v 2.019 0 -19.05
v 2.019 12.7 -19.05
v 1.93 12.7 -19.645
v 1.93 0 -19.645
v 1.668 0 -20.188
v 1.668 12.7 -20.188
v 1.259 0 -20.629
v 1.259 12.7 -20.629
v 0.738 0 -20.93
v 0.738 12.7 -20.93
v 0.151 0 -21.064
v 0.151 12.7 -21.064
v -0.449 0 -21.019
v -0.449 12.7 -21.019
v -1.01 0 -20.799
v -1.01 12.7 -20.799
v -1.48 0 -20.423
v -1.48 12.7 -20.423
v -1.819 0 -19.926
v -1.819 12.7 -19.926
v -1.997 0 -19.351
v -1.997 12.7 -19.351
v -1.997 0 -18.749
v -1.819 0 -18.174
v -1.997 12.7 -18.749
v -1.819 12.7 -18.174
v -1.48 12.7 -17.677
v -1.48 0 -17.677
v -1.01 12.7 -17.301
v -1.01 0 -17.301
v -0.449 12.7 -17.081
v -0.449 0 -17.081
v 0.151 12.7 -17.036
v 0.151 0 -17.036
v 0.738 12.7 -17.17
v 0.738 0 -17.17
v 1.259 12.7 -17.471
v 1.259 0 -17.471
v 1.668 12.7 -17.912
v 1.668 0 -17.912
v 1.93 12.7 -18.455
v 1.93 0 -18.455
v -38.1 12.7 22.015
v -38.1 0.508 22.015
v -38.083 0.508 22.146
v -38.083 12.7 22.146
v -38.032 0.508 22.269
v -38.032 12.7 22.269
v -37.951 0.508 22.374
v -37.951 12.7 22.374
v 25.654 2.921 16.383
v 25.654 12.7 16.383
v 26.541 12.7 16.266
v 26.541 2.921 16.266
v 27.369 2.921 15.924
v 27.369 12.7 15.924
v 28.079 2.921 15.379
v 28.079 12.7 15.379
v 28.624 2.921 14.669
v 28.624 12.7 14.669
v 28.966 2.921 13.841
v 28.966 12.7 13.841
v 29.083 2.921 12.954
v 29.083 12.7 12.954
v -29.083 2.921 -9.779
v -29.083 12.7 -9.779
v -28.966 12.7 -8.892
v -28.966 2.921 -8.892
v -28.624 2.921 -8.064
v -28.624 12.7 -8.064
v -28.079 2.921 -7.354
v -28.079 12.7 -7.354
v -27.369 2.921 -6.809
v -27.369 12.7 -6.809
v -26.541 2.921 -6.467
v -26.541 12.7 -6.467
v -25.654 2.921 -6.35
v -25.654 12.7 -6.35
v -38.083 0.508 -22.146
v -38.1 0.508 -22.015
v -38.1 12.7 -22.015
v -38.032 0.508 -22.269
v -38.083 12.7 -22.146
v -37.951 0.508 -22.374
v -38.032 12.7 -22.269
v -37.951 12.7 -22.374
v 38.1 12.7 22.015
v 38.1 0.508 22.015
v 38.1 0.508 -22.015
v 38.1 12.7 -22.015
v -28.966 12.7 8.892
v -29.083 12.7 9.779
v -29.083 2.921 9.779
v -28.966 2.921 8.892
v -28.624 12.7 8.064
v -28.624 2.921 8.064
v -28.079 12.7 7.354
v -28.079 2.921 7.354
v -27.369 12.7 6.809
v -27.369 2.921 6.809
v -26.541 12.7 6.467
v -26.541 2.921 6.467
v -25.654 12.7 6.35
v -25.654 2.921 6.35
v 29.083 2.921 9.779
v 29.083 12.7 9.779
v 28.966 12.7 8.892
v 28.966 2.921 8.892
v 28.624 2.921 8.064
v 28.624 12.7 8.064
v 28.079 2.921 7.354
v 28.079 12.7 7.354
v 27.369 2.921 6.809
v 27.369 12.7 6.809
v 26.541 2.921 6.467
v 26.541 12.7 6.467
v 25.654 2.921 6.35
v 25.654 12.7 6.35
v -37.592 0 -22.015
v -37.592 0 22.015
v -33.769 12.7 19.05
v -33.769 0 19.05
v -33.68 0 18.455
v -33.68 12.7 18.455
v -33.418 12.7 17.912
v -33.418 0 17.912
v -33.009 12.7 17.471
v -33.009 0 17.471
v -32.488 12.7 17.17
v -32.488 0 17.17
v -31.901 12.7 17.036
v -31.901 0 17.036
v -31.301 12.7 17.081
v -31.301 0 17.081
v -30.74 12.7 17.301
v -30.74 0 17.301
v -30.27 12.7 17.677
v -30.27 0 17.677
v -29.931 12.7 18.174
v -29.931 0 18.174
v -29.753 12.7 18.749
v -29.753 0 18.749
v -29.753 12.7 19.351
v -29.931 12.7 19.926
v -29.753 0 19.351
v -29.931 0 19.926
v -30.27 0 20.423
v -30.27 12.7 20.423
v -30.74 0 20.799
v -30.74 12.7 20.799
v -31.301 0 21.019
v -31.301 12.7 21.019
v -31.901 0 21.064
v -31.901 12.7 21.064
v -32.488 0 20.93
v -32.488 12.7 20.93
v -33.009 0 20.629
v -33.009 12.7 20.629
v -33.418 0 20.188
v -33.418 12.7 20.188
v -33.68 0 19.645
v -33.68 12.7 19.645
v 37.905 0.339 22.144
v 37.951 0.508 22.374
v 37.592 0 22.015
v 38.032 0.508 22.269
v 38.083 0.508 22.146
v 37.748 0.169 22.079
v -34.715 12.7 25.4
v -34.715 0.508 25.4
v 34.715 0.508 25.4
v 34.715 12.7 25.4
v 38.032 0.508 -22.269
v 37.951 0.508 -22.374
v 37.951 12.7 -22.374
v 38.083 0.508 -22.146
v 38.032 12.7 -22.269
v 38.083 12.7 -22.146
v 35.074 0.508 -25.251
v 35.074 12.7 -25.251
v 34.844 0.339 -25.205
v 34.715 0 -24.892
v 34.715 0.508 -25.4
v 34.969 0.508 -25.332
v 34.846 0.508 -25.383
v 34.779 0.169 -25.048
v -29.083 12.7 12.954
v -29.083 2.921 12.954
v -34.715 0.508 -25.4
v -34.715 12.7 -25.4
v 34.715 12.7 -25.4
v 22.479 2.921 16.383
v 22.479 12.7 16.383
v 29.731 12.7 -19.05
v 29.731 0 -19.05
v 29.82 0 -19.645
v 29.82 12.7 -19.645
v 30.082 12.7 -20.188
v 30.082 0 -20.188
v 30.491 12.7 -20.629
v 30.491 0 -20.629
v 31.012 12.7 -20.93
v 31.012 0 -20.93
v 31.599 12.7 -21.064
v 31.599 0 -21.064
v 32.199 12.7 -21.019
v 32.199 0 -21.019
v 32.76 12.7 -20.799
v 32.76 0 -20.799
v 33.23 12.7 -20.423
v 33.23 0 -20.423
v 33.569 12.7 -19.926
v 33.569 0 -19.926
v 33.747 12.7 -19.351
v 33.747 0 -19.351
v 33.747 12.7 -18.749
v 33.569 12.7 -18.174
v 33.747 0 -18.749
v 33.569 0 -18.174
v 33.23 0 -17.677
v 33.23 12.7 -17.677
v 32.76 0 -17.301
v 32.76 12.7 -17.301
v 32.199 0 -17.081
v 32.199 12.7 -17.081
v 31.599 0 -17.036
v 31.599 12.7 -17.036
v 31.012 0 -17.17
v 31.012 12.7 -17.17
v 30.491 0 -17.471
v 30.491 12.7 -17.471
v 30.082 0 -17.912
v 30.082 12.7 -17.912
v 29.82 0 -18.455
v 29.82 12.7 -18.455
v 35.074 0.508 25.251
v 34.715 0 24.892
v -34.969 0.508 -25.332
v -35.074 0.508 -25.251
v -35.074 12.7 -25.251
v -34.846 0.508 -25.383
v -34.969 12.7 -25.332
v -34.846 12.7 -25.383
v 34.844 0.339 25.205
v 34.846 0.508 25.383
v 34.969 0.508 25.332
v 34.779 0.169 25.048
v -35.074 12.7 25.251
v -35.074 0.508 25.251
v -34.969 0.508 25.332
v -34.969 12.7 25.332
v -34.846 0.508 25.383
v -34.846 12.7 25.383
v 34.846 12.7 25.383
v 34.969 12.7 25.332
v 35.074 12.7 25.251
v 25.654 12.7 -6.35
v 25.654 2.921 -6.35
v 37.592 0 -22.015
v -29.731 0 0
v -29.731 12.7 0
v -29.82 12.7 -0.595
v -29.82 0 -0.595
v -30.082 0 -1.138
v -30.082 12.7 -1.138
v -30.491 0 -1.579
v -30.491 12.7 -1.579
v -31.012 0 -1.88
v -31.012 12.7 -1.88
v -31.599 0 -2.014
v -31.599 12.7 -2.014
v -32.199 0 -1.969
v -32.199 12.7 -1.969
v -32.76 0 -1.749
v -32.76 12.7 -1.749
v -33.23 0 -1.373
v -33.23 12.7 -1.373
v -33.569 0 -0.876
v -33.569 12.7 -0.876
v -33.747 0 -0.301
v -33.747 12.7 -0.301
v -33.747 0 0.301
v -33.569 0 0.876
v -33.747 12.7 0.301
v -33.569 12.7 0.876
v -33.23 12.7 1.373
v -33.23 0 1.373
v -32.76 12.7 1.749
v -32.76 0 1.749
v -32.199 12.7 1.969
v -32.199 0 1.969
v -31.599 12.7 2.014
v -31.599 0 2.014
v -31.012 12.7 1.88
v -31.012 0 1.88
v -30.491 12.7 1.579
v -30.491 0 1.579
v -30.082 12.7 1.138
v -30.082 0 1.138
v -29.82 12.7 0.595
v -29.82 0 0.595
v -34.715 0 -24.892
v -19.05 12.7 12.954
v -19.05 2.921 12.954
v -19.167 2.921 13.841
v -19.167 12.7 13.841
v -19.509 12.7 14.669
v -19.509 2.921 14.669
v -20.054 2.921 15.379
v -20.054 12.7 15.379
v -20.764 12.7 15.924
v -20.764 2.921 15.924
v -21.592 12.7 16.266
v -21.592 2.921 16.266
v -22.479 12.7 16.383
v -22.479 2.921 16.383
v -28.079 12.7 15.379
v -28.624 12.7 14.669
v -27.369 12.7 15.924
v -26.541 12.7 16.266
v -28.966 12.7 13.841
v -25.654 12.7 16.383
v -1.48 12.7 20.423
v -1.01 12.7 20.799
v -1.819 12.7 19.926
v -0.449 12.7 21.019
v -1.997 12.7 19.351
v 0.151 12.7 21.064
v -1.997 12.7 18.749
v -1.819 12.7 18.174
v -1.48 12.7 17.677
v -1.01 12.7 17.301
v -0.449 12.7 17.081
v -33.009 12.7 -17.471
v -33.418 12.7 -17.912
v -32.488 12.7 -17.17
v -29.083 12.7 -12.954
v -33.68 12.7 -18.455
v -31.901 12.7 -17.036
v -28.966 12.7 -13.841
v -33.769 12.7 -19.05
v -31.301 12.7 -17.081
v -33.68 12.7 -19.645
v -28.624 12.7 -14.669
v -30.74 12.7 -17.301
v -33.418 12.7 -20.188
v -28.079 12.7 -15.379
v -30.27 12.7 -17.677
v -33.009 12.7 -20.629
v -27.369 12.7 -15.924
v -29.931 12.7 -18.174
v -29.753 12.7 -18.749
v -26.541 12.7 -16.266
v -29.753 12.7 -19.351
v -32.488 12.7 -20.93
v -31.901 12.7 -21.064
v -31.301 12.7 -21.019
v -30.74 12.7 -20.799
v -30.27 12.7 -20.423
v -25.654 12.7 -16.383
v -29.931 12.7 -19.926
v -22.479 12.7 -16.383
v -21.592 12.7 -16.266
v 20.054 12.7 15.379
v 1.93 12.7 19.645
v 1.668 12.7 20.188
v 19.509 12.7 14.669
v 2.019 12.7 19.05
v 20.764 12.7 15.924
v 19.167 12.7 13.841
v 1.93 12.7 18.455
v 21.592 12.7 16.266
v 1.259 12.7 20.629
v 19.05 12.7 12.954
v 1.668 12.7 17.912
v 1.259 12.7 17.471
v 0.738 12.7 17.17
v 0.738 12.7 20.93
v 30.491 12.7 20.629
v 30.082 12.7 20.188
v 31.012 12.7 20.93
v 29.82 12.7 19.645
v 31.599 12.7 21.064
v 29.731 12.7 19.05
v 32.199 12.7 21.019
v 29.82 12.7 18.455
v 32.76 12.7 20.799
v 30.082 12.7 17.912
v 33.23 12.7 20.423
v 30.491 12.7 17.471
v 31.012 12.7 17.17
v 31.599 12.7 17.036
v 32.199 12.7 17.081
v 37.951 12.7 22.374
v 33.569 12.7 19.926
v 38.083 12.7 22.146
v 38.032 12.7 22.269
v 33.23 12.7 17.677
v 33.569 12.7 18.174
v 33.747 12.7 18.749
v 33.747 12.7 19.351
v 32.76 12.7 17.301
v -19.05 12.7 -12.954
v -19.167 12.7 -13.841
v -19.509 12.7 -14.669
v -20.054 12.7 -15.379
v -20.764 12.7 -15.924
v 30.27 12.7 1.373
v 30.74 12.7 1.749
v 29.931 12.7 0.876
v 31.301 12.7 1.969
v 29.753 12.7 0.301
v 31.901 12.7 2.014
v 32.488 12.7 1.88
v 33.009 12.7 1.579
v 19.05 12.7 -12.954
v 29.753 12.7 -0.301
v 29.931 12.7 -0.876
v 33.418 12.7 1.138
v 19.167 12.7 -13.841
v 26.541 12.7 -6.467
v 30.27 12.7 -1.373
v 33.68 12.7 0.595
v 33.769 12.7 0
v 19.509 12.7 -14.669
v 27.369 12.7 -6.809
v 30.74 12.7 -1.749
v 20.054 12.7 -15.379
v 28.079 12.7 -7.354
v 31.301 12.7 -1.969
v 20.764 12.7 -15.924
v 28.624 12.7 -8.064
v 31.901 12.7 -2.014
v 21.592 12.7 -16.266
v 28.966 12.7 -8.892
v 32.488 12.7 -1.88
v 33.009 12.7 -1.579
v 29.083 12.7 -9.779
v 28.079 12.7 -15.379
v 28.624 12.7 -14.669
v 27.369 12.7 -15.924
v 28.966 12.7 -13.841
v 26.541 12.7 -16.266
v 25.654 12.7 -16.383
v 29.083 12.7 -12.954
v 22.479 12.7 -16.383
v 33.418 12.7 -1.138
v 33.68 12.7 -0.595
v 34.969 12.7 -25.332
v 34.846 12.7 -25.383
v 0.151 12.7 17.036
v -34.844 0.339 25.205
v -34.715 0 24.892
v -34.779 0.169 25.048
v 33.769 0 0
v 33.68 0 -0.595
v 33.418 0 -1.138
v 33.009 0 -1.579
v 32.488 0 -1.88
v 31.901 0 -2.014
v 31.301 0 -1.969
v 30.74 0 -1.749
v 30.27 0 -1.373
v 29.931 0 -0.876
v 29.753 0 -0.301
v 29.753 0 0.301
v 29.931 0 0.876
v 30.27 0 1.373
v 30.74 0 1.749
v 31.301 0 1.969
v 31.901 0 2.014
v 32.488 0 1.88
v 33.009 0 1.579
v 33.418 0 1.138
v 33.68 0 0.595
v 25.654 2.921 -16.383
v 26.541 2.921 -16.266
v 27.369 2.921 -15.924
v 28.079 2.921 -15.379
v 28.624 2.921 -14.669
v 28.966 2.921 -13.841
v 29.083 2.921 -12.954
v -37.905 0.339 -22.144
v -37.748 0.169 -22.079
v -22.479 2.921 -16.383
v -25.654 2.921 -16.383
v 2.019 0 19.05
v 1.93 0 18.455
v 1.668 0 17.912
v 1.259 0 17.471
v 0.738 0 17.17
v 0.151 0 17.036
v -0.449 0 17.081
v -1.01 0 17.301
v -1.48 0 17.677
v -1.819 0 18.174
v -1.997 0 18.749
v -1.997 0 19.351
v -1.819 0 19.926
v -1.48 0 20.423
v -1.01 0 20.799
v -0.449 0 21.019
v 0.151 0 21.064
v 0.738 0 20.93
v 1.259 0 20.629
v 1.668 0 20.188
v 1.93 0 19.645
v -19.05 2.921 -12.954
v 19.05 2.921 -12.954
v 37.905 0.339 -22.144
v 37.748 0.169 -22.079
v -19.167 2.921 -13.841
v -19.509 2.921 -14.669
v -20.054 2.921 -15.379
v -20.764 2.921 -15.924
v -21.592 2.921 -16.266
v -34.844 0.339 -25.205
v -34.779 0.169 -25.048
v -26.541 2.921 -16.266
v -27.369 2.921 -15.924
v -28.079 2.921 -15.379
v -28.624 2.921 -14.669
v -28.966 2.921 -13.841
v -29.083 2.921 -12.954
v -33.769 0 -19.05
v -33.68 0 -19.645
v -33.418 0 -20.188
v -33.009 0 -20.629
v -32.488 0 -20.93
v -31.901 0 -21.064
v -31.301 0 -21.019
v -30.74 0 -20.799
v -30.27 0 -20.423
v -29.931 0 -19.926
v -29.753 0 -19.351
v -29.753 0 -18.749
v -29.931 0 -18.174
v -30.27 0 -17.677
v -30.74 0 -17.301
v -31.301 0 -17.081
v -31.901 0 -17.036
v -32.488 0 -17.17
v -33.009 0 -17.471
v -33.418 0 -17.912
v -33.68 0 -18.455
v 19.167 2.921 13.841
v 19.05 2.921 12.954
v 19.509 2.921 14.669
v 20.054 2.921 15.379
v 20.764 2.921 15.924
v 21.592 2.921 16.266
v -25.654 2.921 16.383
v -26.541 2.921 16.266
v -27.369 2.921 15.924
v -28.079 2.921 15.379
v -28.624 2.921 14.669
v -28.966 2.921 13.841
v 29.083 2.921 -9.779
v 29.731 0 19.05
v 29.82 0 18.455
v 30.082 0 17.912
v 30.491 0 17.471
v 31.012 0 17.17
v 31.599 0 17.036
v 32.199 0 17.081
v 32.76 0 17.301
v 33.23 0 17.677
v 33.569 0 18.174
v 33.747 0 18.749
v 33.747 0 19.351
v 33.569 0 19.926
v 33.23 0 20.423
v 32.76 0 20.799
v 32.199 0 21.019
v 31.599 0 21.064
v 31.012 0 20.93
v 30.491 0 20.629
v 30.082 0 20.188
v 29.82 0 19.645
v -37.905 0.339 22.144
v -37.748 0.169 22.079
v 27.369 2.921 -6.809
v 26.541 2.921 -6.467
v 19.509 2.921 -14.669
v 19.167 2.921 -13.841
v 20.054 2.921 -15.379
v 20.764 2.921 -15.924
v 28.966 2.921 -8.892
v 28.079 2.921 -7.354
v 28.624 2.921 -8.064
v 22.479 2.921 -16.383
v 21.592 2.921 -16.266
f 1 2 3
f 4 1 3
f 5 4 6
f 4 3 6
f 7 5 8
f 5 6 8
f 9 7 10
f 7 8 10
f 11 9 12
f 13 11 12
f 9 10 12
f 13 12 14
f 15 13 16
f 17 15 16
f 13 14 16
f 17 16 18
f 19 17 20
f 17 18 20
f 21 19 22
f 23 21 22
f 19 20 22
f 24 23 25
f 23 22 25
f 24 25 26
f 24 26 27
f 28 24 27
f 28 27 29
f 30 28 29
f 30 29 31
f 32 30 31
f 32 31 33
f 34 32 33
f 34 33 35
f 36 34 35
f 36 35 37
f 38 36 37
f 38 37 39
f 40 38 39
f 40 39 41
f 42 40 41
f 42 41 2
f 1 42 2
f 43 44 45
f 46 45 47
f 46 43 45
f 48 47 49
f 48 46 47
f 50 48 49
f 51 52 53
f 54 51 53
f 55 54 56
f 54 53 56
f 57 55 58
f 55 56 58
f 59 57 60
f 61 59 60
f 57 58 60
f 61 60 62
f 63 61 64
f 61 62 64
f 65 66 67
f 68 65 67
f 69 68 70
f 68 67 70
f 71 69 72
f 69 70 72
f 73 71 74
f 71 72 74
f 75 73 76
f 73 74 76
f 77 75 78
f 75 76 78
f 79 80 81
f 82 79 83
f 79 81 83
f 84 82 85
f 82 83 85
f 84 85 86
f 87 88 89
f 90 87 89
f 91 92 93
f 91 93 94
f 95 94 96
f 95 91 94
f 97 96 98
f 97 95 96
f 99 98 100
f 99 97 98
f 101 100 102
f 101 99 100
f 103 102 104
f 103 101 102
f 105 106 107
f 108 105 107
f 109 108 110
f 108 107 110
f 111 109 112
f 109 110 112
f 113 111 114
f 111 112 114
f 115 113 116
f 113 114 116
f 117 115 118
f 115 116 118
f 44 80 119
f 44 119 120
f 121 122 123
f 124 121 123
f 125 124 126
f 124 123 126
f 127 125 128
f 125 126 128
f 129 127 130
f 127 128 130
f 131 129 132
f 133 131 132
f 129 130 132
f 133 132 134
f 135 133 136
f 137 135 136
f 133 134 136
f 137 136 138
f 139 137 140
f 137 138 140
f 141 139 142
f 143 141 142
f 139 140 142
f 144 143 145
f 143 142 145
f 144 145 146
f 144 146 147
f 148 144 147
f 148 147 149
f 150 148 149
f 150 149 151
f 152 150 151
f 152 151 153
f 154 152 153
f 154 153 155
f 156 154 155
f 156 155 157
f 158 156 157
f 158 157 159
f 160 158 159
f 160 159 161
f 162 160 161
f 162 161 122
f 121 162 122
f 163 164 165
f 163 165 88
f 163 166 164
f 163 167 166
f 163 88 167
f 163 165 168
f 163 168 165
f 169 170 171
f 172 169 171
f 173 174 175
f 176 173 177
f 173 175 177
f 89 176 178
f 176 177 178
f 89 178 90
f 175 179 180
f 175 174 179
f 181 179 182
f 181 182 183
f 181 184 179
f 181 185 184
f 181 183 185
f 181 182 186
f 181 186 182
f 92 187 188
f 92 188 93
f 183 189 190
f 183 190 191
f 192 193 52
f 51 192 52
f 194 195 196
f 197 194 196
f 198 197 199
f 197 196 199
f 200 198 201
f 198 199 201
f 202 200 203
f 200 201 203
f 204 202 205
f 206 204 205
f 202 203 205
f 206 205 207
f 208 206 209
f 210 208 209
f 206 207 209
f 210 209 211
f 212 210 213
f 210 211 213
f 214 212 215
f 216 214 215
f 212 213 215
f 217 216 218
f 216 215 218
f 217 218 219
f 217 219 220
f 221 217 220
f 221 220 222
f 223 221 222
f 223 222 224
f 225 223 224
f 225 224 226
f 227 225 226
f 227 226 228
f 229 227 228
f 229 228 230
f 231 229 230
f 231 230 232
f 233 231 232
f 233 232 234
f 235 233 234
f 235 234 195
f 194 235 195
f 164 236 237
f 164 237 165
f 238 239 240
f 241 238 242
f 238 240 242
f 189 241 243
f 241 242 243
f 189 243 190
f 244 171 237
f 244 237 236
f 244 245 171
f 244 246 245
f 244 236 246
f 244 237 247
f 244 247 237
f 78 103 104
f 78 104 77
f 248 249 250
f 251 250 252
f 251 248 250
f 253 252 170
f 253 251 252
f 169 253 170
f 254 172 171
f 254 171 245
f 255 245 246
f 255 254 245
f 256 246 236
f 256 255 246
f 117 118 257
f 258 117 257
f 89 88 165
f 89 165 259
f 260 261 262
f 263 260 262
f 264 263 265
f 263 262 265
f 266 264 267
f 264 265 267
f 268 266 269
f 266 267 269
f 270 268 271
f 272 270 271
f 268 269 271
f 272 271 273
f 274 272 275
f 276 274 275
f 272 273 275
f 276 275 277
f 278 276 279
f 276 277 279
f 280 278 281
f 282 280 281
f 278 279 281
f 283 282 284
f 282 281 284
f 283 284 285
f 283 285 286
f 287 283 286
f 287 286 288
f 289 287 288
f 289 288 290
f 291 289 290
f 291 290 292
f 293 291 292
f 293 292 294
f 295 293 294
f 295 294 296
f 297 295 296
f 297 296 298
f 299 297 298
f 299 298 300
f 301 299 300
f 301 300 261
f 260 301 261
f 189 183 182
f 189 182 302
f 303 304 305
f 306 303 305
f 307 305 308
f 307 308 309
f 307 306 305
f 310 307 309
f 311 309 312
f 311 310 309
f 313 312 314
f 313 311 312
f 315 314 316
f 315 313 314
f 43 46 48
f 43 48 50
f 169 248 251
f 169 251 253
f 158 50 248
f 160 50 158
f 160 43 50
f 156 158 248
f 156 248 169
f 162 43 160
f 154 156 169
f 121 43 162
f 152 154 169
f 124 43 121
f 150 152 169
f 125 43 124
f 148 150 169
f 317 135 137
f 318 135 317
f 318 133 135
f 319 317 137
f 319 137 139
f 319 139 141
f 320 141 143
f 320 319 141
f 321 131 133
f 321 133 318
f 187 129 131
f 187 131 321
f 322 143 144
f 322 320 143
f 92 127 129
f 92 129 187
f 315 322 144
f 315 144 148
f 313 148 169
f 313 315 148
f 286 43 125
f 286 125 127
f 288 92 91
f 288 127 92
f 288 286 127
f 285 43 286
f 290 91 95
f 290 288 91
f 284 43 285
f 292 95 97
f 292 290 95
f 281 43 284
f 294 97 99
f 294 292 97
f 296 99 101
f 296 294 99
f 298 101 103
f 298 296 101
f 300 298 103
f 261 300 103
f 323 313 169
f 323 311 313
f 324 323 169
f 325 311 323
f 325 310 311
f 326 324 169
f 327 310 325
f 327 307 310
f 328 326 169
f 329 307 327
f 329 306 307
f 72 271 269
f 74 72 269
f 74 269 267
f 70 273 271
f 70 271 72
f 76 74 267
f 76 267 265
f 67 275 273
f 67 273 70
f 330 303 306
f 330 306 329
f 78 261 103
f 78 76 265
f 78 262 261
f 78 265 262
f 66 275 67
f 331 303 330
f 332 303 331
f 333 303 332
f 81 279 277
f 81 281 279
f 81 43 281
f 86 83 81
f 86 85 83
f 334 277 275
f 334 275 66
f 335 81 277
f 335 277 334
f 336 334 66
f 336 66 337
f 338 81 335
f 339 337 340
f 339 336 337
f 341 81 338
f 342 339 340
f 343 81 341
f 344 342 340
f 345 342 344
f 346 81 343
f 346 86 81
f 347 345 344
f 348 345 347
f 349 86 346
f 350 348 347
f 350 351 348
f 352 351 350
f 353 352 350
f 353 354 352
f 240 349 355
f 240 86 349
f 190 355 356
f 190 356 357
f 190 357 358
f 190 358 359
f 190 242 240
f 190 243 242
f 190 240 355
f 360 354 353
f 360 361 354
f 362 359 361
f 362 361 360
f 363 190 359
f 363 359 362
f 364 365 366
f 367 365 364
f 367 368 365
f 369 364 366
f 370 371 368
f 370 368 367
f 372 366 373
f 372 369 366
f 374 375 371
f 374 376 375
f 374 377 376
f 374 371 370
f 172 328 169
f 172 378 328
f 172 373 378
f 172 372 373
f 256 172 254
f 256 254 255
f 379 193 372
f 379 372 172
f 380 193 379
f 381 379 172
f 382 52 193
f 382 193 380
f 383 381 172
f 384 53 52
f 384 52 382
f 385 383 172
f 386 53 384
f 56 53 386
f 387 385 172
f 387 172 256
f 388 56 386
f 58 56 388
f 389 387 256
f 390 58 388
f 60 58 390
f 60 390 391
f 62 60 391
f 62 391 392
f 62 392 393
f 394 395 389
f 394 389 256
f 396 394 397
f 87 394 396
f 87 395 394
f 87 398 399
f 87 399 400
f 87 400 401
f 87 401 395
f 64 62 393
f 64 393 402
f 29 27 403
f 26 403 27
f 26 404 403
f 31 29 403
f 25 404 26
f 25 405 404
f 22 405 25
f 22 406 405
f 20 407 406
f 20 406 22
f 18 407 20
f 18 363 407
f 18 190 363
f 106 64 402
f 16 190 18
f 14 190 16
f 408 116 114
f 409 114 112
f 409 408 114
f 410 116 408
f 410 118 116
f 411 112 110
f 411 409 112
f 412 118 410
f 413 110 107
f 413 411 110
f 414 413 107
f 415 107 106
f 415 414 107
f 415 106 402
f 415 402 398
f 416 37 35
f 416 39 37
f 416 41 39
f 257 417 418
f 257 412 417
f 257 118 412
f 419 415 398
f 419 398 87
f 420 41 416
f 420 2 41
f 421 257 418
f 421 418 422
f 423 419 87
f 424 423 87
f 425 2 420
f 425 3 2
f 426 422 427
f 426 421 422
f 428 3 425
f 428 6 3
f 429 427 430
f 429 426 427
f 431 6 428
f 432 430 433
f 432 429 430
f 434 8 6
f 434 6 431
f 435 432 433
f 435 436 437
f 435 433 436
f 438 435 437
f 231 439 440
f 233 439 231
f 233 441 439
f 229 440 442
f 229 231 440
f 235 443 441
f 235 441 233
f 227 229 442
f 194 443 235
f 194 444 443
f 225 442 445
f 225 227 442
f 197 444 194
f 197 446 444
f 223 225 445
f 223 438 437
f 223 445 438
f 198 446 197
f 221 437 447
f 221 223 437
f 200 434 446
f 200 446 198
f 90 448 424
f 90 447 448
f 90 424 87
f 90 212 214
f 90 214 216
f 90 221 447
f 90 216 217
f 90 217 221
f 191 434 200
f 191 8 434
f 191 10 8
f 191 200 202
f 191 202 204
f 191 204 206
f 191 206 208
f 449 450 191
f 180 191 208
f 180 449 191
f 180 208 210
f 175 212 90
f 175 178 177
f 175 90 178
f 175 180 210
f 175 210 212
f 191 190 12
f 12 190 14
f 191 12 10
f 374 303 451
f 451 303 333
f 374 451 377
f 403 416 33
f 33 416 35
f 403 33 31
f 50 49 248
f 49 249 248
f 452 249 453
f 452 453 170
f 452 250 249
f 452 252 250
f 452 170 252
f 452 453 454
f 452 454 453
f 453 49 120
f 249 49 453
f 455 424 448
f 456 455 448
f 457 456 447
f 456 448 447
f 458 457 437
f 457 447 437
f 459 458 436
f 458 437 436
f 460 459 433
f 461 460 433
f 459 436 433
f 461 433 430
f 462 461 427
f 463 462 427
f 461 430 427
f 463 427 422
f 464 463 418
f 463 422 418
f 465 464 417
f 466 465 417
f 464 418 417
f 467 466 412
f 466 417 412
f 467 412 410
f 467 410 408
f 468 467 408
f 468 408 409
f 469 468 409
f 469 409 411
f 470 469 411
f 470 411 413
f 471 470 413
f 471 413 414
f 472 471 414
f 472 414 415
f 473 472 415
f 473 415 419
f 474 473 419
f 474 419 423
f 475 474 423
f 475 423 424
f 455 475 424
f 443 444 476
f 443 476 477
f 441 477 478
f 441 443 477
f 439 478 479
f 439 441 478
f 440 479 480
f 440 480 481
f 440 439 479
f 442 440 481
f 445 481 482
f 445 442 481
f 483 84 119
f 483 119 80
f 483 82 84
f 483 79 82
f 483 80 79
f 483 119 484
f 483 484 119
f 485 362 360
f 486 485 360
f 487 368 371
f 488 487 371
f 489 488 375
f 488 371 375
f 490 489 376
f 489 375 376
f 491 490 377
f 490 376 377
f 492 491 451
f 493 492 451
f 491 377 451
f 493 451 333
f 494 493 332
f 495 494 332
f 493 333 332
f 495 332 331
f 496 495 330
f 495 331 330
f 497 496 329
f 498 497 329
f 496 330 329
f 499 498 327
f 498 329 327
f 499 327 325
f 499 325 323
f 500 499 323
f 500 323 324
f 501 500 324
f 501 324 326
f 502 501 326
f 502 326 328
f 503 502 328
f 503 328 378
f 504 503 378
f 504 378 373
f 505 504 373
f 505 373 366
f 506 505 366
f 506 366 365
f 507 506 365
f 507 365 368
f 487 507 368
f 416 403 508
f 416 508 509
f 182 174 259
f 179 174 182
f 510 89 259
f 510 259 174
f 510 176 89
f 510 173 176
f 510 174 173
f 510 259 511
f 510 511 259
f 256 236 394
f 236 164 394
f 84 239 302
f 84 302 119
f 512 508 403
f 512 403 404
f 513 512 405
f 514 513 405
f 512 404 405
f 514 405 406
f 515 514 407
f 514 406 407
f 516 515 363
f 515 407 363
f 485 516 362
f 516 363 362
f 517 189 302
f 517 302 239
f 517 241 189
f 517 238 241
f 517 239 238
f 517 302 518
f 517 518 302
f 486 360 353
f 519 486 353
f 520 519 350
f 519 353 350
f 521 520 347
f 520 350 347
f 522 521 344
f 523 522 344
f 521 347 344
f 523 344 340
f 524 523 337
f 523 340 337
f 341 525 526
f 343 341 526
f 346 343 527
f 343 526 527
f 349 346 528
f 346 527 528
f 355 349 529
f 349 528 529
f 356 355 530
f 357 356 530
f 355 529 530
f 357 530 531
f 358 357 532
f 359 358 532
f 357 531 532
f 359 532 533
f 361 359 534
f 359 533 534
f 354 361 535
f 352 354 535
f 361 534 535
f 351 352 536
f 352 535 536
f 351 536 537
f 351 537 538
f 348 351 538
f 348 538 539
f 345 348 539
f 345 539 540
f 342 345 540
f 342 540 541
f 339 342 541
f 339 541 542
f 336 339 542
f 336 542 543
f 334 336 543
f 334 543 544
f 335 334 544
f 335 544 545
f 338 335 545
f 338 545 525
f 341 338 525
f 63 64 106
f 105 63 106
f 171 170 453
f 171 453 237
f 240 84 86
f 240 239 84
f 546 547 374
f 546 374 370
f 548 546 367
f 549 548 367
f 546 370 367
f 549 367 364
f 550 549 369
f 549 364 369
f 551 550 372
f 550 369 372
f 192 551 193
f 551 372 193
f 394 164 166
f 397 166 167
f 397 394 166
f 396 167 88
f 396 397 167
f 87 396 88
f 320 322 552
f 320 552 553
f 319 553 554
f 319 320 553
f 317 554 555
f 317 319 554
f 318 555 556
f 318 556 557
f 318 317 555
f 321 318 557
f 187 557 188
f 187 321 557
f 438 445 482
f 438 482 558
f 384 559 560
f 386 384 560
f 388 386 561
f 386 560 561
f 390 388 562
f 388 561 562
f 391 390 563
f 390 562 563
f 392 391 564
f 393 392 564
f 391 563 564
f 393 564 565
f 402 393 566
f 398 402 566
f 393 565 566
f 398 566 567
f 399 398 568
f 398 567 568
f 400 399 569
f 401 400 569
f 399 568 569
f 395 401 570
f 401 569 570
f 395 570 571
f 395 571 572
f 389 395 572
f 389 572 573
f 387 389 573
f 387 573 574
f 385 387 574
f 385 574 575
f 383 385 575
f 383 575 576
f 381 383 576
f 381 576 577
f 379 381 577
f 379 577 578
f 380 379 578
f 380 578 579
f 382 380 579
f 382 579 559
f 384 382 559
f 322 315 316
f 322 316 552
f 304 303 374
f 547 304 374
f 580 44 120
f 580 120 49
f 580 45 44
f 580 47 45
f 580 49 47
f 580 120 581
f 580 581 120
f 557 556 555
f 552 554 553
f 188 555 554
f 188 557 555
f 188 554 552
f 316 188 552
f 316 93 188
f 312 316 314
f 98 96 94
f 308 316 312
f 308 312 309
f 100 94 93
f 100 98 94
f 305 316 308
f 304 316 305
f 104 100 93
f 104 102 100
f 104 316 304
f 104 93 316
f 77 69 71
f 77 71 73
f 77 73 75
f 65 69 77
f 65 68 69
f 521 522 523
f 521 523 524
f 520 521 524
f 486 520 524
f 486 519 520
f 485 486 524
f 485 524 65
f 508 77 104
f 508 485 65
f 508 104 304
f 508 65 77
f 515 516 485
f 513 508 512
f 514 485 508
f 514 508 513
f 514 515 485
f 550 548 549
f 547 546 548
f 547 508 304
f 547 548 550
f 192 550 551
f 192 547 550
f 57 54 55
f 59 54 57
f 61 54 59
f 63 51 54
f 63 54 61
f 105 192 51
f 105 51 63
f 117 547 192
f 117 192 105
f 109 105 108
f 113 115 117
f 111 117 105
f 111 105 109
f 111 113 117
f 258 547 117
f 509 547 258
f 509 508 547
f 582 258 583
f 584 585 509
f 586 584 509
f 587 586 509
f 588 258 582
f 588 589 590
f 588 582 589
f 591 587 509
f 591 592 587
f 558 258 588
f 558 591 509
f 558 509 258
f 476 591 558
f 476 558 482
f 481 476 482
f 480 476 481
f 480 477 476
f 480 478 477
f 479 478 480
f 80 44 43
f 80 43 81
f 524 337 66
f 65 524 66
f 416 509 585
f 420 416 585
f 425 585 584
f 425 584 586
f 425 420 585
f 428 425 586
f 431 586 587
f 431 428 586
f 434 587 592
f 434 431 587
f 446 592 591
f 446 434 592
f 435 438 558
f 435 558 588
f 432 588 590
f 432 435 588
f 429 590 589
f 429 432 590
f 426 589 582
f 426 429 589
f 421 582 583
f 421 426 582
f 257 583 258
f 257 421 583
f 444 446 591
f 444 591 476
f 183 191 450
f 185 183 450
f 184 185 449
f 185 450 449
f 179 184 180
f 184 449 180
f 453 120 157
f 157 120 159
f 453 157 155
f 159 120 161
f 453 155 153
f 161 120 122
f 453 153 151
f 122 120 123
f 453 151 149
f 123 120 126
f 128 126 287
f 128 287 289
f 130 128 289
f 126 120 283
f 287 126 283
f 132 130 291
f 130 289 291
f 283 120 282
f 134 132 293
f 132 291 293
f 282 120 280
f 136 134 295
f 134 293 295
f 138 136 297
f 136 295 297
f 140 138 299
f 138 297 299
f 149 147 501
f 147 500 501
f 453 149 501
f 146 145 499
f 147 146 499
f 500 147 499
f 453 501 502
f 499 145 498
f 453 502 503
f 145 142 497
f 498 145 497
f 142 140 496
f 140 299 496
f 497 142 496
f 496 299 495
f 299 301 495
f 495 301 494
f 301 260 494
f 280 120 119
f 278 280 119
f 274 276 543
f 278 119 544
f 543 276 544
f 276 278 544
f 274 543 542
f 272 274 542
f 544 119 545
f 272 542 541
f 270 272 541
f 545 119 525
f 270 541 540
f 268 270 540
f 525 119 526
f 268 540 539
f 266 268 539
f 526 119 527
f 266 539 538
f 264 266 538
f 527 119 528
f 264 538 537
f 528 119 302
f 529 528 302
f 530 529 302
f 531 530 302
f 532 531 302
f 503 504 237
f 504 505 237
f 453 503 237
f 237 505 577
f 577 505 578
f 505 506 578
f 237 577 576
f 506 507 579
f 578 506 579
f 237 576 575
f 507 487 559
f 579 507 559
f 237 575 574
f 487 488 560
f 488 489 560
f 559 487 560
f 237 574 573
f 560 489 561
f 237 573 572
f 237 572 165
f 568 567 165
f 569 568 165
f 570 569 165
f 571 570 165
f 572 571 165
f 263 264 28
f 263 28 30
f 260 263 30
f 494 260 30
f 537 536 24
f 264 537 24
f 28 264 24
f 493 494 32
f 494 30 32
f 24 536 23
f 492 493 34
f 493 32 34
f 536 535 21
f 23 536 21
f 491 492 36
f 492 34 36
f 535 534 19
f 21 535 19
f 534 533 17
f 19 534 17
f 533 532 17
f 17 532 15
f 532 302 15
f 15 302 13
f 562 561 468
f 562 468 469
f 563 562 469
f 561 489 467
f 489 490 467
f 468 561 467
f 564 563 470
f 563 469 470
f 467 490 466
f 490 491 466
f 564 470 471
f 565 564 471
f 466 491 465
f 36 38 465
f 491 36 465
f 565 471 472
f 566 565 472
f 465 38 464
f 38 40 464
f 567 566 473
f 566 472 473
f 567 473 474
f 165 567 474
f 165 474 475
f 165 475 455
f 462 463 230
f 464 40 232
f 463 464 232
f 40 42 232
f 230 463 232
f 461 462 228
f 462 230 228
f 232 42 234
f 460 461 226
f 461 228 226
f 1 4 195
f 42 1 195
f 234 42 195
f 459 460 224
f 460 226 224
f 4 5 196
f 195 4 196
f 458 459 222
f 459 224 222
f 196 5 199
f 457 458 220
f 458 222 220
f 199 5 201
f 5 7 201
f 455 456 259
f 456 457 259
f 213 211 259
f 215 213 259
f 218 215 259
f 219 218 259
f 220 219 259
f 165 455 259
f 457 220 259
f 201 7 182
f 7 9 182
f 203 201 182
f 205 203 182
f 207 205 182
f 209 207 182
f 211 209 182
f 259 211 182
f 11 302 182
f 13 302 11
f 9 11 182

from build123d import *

# Parameters (mm, degrees)
SKETCH1_W              = 76.2
SKETCH1_H              = 50.8
BOSS_EXTRUDE1_DEPTH    = 12.7
SKETCH2_W              = 51.308
SKETCH2_H              = 25.908
CUT_EXTRUDE1_DEPTH     = 9.779
CUT_EXTRUDE2_DEPTH     = 9.779
MIRROR2_COPY_1_DEPTH   = 9.779
F_10_32_TAPPED_HOLE1_D = 4.0386
CHAMFER1_SIZE          = 3.175
FILLET1_R              = 0.508
CHAMFER2_SIZE          = 0.508
F_10_32_TAPPED_HOLE2_D = 4.0386


with BuildPart() as part:
    # Sketch1 → Boss-Extrude1 (new body)
    with BuildSketch(Plane(origin=(0, 0, 0), x_dir=(1, 0, 0), z_dir=(0, 1, 0))):
        Rectangle(SKETCH1_W, SKETCH1_H)
    extrude(amount=BOSS_EXTRUDE1_DEPTH)

    # Sketch2 → Cut-Extrude1 (cut)
    with BuildSketch(Plane(origin=(0, 12.7, 0), x_dir=(1, 0, 0), z_dir=(0, 1, 0))):
        Rectangle(SKETCH2_W, SKETCH2_H)
    extrude(amount=-CUT_EXTRUDE1_DEPTH, mode=Mode.SUBTRACT)

    # Sketch3 → Cut-Extrude2 (cut)
    with BuildSketch(Plane(origin=(0, 12.7, 0), x_dir=(1, 0, 0), z_dir=(0, 1, 0))):
        with BuildLine():
            Line((-22.479, 16.383), (-25.654, 16.383))
            ThreePointArc((-25.654, 16.383), (-28.078669153, 15.378669153), (-29.083, 12.954))
            Line((-29.083, 12.954), (-29.083, 9.779))
            ThreePointArc((-29.083, 9.779), (-26.96622149, 6.611017083), (-23.229330847, 7.354330847))
            Line((-23.229330847, 7.354330847), (-20.054330847, 10.529330847))
            ThreePointArc((-20.054330847, 10.529330847), (-19.311017083, 14.26622149), (-22.479, 16.383))
        make_face()
    cut_extrude2 = extrude(amount=-CUT_EXTRUDE2_DEPTH, mode=Mode.SUBTRACT)

    # Mirror1: Cut-Extrude2 across plane
    add(cut_extrude2.mirror(Plane.XY), mode=Mode.SUBTRACT)

    # Mirror2: Cut-Extrude2 across plane
    add(cut_extrude2.mirror(Plane(origin=(0, 0, 0), x_dir=(0, 0, 1), z_dir=(1, 0, 0))), mode=Mode.SUBTRACT)

    # Mirror2 copy 1 sketch → Mirror2 copy 1 (cut)
    with BuildSketch(Plane(origin=(0, 12.7, 0), x_dir=(-1, 0, 0), z_dir=(0, 1, 0))):
        with BuildLine():
            Line((-22.479, 16.383), (-25.654, 16.383))
            ThreePointArc((-25.654, 16.383), (-28.078669153, 15.378669153), (-29.083, 12.954))
            Line((-29.083, 12.954), (-29.083, 9.779))
            ThreePointArc((-29.083, 9.779), (-26.96622149, 6.611017083), (-23.229330847, 7.354330847))
            Line((-23.229330847, 7.354330847), (-20.054330847, 10.529330847))
            ThreePointArc((-20.054330847, 10.529330847), (-19.311017083, 14.26622149), (-22.479, 16.383))
        make_face()
    extrude(amount=-MIRROR2_COPY_1_DEPTH, mode=Mode.SUBTRACT)

    # #10-32 Tapped Hole1 (through all)
    with Locations(Plane(origin=(0, 12.7, 0), x_dir=(1, 0, 0), z_dir=(0, 1, 0))):
        with Locations((-31.75, 19.05), (31.75, 19.05), (31.75, -19.05), (-31.75, -19.05)):
            Hole(F_10_32_TAPPED_HOLE1_D / 2)

    # Chamfer1
    chamfer1_edges = [part.edges().sort_by_distance(p)[0] for p in [
        (38.1, 6.35, 25.4),
        (-38.1, 6.35, 25.4),
        (-38.1, 6.35, -25.4),
        (38.1, 6.35, -25.4),
    ]]
    chamfer(chamfer1_edges, length=CHAMFER1_SIZE)

    # Fillet1
    fillet1_edges = [part.edges().sort_by_distance(p)[0] for p in [
        (-38.1, 6.35, 22.225),
        (-38.1, 6.35, -22.225),
        (34.925, 6.35, -25.4),
        (-34.925, 6.35, -25.4),
        (38.1, 6.35, 22.225),
        (38.1, 6.35, -22.225),
        (-34.925, 6.35, 25.4),
        (34.925, 6.35, 25.4),
    ]]
    fillet(fillet1_edges, radius=FILLET1_R)

    # Chamfer2
    chamfer2_edges = [part.edges().sort_by_distance(p)[0] for p in [
        (38.1, 0, 0),
        (36.5125, 0, -23.8125),
        (-38.1, 0, 0),
        (-36.5125, 0, -23.8125),
        (0, 0, -25.4),
        (36.5125, 0, 23.8125),
        (0, 0, 25.4),
        (-36.5125, 0, 23.8125),
        (34.908982694, 0, 25.361330803),
        (38.061330803, 0, 22.208982694),
        (-38.061330803, 0, 22.208982694),
        (-34.908982694, 0, 25.361330803),
        (-38.061330803, 0, -22.208982694),
        (-34.908982694, 0, -25.361330803),
        (34.908982694, 0, -25.361330803),
        (38.061330803, 0, -22.208982694),
    ]]
    chamfer(chamfer2_edges, length=CHAMFER2_SIZE)

    # #10-32 Tapped Hole2 (through all)
    with Locations(Plane(origin=(0, 0, 0), x_dir=(-1, 0, 0), z_dir=(0, -1, 0))):
        with Locations((0, 19.05), (0, -19.05), (31.75, 0), (-31.75, 0)):
            Hole(F_10_32_TAPPED_HOLE2_D / 2)


solid = part.part
